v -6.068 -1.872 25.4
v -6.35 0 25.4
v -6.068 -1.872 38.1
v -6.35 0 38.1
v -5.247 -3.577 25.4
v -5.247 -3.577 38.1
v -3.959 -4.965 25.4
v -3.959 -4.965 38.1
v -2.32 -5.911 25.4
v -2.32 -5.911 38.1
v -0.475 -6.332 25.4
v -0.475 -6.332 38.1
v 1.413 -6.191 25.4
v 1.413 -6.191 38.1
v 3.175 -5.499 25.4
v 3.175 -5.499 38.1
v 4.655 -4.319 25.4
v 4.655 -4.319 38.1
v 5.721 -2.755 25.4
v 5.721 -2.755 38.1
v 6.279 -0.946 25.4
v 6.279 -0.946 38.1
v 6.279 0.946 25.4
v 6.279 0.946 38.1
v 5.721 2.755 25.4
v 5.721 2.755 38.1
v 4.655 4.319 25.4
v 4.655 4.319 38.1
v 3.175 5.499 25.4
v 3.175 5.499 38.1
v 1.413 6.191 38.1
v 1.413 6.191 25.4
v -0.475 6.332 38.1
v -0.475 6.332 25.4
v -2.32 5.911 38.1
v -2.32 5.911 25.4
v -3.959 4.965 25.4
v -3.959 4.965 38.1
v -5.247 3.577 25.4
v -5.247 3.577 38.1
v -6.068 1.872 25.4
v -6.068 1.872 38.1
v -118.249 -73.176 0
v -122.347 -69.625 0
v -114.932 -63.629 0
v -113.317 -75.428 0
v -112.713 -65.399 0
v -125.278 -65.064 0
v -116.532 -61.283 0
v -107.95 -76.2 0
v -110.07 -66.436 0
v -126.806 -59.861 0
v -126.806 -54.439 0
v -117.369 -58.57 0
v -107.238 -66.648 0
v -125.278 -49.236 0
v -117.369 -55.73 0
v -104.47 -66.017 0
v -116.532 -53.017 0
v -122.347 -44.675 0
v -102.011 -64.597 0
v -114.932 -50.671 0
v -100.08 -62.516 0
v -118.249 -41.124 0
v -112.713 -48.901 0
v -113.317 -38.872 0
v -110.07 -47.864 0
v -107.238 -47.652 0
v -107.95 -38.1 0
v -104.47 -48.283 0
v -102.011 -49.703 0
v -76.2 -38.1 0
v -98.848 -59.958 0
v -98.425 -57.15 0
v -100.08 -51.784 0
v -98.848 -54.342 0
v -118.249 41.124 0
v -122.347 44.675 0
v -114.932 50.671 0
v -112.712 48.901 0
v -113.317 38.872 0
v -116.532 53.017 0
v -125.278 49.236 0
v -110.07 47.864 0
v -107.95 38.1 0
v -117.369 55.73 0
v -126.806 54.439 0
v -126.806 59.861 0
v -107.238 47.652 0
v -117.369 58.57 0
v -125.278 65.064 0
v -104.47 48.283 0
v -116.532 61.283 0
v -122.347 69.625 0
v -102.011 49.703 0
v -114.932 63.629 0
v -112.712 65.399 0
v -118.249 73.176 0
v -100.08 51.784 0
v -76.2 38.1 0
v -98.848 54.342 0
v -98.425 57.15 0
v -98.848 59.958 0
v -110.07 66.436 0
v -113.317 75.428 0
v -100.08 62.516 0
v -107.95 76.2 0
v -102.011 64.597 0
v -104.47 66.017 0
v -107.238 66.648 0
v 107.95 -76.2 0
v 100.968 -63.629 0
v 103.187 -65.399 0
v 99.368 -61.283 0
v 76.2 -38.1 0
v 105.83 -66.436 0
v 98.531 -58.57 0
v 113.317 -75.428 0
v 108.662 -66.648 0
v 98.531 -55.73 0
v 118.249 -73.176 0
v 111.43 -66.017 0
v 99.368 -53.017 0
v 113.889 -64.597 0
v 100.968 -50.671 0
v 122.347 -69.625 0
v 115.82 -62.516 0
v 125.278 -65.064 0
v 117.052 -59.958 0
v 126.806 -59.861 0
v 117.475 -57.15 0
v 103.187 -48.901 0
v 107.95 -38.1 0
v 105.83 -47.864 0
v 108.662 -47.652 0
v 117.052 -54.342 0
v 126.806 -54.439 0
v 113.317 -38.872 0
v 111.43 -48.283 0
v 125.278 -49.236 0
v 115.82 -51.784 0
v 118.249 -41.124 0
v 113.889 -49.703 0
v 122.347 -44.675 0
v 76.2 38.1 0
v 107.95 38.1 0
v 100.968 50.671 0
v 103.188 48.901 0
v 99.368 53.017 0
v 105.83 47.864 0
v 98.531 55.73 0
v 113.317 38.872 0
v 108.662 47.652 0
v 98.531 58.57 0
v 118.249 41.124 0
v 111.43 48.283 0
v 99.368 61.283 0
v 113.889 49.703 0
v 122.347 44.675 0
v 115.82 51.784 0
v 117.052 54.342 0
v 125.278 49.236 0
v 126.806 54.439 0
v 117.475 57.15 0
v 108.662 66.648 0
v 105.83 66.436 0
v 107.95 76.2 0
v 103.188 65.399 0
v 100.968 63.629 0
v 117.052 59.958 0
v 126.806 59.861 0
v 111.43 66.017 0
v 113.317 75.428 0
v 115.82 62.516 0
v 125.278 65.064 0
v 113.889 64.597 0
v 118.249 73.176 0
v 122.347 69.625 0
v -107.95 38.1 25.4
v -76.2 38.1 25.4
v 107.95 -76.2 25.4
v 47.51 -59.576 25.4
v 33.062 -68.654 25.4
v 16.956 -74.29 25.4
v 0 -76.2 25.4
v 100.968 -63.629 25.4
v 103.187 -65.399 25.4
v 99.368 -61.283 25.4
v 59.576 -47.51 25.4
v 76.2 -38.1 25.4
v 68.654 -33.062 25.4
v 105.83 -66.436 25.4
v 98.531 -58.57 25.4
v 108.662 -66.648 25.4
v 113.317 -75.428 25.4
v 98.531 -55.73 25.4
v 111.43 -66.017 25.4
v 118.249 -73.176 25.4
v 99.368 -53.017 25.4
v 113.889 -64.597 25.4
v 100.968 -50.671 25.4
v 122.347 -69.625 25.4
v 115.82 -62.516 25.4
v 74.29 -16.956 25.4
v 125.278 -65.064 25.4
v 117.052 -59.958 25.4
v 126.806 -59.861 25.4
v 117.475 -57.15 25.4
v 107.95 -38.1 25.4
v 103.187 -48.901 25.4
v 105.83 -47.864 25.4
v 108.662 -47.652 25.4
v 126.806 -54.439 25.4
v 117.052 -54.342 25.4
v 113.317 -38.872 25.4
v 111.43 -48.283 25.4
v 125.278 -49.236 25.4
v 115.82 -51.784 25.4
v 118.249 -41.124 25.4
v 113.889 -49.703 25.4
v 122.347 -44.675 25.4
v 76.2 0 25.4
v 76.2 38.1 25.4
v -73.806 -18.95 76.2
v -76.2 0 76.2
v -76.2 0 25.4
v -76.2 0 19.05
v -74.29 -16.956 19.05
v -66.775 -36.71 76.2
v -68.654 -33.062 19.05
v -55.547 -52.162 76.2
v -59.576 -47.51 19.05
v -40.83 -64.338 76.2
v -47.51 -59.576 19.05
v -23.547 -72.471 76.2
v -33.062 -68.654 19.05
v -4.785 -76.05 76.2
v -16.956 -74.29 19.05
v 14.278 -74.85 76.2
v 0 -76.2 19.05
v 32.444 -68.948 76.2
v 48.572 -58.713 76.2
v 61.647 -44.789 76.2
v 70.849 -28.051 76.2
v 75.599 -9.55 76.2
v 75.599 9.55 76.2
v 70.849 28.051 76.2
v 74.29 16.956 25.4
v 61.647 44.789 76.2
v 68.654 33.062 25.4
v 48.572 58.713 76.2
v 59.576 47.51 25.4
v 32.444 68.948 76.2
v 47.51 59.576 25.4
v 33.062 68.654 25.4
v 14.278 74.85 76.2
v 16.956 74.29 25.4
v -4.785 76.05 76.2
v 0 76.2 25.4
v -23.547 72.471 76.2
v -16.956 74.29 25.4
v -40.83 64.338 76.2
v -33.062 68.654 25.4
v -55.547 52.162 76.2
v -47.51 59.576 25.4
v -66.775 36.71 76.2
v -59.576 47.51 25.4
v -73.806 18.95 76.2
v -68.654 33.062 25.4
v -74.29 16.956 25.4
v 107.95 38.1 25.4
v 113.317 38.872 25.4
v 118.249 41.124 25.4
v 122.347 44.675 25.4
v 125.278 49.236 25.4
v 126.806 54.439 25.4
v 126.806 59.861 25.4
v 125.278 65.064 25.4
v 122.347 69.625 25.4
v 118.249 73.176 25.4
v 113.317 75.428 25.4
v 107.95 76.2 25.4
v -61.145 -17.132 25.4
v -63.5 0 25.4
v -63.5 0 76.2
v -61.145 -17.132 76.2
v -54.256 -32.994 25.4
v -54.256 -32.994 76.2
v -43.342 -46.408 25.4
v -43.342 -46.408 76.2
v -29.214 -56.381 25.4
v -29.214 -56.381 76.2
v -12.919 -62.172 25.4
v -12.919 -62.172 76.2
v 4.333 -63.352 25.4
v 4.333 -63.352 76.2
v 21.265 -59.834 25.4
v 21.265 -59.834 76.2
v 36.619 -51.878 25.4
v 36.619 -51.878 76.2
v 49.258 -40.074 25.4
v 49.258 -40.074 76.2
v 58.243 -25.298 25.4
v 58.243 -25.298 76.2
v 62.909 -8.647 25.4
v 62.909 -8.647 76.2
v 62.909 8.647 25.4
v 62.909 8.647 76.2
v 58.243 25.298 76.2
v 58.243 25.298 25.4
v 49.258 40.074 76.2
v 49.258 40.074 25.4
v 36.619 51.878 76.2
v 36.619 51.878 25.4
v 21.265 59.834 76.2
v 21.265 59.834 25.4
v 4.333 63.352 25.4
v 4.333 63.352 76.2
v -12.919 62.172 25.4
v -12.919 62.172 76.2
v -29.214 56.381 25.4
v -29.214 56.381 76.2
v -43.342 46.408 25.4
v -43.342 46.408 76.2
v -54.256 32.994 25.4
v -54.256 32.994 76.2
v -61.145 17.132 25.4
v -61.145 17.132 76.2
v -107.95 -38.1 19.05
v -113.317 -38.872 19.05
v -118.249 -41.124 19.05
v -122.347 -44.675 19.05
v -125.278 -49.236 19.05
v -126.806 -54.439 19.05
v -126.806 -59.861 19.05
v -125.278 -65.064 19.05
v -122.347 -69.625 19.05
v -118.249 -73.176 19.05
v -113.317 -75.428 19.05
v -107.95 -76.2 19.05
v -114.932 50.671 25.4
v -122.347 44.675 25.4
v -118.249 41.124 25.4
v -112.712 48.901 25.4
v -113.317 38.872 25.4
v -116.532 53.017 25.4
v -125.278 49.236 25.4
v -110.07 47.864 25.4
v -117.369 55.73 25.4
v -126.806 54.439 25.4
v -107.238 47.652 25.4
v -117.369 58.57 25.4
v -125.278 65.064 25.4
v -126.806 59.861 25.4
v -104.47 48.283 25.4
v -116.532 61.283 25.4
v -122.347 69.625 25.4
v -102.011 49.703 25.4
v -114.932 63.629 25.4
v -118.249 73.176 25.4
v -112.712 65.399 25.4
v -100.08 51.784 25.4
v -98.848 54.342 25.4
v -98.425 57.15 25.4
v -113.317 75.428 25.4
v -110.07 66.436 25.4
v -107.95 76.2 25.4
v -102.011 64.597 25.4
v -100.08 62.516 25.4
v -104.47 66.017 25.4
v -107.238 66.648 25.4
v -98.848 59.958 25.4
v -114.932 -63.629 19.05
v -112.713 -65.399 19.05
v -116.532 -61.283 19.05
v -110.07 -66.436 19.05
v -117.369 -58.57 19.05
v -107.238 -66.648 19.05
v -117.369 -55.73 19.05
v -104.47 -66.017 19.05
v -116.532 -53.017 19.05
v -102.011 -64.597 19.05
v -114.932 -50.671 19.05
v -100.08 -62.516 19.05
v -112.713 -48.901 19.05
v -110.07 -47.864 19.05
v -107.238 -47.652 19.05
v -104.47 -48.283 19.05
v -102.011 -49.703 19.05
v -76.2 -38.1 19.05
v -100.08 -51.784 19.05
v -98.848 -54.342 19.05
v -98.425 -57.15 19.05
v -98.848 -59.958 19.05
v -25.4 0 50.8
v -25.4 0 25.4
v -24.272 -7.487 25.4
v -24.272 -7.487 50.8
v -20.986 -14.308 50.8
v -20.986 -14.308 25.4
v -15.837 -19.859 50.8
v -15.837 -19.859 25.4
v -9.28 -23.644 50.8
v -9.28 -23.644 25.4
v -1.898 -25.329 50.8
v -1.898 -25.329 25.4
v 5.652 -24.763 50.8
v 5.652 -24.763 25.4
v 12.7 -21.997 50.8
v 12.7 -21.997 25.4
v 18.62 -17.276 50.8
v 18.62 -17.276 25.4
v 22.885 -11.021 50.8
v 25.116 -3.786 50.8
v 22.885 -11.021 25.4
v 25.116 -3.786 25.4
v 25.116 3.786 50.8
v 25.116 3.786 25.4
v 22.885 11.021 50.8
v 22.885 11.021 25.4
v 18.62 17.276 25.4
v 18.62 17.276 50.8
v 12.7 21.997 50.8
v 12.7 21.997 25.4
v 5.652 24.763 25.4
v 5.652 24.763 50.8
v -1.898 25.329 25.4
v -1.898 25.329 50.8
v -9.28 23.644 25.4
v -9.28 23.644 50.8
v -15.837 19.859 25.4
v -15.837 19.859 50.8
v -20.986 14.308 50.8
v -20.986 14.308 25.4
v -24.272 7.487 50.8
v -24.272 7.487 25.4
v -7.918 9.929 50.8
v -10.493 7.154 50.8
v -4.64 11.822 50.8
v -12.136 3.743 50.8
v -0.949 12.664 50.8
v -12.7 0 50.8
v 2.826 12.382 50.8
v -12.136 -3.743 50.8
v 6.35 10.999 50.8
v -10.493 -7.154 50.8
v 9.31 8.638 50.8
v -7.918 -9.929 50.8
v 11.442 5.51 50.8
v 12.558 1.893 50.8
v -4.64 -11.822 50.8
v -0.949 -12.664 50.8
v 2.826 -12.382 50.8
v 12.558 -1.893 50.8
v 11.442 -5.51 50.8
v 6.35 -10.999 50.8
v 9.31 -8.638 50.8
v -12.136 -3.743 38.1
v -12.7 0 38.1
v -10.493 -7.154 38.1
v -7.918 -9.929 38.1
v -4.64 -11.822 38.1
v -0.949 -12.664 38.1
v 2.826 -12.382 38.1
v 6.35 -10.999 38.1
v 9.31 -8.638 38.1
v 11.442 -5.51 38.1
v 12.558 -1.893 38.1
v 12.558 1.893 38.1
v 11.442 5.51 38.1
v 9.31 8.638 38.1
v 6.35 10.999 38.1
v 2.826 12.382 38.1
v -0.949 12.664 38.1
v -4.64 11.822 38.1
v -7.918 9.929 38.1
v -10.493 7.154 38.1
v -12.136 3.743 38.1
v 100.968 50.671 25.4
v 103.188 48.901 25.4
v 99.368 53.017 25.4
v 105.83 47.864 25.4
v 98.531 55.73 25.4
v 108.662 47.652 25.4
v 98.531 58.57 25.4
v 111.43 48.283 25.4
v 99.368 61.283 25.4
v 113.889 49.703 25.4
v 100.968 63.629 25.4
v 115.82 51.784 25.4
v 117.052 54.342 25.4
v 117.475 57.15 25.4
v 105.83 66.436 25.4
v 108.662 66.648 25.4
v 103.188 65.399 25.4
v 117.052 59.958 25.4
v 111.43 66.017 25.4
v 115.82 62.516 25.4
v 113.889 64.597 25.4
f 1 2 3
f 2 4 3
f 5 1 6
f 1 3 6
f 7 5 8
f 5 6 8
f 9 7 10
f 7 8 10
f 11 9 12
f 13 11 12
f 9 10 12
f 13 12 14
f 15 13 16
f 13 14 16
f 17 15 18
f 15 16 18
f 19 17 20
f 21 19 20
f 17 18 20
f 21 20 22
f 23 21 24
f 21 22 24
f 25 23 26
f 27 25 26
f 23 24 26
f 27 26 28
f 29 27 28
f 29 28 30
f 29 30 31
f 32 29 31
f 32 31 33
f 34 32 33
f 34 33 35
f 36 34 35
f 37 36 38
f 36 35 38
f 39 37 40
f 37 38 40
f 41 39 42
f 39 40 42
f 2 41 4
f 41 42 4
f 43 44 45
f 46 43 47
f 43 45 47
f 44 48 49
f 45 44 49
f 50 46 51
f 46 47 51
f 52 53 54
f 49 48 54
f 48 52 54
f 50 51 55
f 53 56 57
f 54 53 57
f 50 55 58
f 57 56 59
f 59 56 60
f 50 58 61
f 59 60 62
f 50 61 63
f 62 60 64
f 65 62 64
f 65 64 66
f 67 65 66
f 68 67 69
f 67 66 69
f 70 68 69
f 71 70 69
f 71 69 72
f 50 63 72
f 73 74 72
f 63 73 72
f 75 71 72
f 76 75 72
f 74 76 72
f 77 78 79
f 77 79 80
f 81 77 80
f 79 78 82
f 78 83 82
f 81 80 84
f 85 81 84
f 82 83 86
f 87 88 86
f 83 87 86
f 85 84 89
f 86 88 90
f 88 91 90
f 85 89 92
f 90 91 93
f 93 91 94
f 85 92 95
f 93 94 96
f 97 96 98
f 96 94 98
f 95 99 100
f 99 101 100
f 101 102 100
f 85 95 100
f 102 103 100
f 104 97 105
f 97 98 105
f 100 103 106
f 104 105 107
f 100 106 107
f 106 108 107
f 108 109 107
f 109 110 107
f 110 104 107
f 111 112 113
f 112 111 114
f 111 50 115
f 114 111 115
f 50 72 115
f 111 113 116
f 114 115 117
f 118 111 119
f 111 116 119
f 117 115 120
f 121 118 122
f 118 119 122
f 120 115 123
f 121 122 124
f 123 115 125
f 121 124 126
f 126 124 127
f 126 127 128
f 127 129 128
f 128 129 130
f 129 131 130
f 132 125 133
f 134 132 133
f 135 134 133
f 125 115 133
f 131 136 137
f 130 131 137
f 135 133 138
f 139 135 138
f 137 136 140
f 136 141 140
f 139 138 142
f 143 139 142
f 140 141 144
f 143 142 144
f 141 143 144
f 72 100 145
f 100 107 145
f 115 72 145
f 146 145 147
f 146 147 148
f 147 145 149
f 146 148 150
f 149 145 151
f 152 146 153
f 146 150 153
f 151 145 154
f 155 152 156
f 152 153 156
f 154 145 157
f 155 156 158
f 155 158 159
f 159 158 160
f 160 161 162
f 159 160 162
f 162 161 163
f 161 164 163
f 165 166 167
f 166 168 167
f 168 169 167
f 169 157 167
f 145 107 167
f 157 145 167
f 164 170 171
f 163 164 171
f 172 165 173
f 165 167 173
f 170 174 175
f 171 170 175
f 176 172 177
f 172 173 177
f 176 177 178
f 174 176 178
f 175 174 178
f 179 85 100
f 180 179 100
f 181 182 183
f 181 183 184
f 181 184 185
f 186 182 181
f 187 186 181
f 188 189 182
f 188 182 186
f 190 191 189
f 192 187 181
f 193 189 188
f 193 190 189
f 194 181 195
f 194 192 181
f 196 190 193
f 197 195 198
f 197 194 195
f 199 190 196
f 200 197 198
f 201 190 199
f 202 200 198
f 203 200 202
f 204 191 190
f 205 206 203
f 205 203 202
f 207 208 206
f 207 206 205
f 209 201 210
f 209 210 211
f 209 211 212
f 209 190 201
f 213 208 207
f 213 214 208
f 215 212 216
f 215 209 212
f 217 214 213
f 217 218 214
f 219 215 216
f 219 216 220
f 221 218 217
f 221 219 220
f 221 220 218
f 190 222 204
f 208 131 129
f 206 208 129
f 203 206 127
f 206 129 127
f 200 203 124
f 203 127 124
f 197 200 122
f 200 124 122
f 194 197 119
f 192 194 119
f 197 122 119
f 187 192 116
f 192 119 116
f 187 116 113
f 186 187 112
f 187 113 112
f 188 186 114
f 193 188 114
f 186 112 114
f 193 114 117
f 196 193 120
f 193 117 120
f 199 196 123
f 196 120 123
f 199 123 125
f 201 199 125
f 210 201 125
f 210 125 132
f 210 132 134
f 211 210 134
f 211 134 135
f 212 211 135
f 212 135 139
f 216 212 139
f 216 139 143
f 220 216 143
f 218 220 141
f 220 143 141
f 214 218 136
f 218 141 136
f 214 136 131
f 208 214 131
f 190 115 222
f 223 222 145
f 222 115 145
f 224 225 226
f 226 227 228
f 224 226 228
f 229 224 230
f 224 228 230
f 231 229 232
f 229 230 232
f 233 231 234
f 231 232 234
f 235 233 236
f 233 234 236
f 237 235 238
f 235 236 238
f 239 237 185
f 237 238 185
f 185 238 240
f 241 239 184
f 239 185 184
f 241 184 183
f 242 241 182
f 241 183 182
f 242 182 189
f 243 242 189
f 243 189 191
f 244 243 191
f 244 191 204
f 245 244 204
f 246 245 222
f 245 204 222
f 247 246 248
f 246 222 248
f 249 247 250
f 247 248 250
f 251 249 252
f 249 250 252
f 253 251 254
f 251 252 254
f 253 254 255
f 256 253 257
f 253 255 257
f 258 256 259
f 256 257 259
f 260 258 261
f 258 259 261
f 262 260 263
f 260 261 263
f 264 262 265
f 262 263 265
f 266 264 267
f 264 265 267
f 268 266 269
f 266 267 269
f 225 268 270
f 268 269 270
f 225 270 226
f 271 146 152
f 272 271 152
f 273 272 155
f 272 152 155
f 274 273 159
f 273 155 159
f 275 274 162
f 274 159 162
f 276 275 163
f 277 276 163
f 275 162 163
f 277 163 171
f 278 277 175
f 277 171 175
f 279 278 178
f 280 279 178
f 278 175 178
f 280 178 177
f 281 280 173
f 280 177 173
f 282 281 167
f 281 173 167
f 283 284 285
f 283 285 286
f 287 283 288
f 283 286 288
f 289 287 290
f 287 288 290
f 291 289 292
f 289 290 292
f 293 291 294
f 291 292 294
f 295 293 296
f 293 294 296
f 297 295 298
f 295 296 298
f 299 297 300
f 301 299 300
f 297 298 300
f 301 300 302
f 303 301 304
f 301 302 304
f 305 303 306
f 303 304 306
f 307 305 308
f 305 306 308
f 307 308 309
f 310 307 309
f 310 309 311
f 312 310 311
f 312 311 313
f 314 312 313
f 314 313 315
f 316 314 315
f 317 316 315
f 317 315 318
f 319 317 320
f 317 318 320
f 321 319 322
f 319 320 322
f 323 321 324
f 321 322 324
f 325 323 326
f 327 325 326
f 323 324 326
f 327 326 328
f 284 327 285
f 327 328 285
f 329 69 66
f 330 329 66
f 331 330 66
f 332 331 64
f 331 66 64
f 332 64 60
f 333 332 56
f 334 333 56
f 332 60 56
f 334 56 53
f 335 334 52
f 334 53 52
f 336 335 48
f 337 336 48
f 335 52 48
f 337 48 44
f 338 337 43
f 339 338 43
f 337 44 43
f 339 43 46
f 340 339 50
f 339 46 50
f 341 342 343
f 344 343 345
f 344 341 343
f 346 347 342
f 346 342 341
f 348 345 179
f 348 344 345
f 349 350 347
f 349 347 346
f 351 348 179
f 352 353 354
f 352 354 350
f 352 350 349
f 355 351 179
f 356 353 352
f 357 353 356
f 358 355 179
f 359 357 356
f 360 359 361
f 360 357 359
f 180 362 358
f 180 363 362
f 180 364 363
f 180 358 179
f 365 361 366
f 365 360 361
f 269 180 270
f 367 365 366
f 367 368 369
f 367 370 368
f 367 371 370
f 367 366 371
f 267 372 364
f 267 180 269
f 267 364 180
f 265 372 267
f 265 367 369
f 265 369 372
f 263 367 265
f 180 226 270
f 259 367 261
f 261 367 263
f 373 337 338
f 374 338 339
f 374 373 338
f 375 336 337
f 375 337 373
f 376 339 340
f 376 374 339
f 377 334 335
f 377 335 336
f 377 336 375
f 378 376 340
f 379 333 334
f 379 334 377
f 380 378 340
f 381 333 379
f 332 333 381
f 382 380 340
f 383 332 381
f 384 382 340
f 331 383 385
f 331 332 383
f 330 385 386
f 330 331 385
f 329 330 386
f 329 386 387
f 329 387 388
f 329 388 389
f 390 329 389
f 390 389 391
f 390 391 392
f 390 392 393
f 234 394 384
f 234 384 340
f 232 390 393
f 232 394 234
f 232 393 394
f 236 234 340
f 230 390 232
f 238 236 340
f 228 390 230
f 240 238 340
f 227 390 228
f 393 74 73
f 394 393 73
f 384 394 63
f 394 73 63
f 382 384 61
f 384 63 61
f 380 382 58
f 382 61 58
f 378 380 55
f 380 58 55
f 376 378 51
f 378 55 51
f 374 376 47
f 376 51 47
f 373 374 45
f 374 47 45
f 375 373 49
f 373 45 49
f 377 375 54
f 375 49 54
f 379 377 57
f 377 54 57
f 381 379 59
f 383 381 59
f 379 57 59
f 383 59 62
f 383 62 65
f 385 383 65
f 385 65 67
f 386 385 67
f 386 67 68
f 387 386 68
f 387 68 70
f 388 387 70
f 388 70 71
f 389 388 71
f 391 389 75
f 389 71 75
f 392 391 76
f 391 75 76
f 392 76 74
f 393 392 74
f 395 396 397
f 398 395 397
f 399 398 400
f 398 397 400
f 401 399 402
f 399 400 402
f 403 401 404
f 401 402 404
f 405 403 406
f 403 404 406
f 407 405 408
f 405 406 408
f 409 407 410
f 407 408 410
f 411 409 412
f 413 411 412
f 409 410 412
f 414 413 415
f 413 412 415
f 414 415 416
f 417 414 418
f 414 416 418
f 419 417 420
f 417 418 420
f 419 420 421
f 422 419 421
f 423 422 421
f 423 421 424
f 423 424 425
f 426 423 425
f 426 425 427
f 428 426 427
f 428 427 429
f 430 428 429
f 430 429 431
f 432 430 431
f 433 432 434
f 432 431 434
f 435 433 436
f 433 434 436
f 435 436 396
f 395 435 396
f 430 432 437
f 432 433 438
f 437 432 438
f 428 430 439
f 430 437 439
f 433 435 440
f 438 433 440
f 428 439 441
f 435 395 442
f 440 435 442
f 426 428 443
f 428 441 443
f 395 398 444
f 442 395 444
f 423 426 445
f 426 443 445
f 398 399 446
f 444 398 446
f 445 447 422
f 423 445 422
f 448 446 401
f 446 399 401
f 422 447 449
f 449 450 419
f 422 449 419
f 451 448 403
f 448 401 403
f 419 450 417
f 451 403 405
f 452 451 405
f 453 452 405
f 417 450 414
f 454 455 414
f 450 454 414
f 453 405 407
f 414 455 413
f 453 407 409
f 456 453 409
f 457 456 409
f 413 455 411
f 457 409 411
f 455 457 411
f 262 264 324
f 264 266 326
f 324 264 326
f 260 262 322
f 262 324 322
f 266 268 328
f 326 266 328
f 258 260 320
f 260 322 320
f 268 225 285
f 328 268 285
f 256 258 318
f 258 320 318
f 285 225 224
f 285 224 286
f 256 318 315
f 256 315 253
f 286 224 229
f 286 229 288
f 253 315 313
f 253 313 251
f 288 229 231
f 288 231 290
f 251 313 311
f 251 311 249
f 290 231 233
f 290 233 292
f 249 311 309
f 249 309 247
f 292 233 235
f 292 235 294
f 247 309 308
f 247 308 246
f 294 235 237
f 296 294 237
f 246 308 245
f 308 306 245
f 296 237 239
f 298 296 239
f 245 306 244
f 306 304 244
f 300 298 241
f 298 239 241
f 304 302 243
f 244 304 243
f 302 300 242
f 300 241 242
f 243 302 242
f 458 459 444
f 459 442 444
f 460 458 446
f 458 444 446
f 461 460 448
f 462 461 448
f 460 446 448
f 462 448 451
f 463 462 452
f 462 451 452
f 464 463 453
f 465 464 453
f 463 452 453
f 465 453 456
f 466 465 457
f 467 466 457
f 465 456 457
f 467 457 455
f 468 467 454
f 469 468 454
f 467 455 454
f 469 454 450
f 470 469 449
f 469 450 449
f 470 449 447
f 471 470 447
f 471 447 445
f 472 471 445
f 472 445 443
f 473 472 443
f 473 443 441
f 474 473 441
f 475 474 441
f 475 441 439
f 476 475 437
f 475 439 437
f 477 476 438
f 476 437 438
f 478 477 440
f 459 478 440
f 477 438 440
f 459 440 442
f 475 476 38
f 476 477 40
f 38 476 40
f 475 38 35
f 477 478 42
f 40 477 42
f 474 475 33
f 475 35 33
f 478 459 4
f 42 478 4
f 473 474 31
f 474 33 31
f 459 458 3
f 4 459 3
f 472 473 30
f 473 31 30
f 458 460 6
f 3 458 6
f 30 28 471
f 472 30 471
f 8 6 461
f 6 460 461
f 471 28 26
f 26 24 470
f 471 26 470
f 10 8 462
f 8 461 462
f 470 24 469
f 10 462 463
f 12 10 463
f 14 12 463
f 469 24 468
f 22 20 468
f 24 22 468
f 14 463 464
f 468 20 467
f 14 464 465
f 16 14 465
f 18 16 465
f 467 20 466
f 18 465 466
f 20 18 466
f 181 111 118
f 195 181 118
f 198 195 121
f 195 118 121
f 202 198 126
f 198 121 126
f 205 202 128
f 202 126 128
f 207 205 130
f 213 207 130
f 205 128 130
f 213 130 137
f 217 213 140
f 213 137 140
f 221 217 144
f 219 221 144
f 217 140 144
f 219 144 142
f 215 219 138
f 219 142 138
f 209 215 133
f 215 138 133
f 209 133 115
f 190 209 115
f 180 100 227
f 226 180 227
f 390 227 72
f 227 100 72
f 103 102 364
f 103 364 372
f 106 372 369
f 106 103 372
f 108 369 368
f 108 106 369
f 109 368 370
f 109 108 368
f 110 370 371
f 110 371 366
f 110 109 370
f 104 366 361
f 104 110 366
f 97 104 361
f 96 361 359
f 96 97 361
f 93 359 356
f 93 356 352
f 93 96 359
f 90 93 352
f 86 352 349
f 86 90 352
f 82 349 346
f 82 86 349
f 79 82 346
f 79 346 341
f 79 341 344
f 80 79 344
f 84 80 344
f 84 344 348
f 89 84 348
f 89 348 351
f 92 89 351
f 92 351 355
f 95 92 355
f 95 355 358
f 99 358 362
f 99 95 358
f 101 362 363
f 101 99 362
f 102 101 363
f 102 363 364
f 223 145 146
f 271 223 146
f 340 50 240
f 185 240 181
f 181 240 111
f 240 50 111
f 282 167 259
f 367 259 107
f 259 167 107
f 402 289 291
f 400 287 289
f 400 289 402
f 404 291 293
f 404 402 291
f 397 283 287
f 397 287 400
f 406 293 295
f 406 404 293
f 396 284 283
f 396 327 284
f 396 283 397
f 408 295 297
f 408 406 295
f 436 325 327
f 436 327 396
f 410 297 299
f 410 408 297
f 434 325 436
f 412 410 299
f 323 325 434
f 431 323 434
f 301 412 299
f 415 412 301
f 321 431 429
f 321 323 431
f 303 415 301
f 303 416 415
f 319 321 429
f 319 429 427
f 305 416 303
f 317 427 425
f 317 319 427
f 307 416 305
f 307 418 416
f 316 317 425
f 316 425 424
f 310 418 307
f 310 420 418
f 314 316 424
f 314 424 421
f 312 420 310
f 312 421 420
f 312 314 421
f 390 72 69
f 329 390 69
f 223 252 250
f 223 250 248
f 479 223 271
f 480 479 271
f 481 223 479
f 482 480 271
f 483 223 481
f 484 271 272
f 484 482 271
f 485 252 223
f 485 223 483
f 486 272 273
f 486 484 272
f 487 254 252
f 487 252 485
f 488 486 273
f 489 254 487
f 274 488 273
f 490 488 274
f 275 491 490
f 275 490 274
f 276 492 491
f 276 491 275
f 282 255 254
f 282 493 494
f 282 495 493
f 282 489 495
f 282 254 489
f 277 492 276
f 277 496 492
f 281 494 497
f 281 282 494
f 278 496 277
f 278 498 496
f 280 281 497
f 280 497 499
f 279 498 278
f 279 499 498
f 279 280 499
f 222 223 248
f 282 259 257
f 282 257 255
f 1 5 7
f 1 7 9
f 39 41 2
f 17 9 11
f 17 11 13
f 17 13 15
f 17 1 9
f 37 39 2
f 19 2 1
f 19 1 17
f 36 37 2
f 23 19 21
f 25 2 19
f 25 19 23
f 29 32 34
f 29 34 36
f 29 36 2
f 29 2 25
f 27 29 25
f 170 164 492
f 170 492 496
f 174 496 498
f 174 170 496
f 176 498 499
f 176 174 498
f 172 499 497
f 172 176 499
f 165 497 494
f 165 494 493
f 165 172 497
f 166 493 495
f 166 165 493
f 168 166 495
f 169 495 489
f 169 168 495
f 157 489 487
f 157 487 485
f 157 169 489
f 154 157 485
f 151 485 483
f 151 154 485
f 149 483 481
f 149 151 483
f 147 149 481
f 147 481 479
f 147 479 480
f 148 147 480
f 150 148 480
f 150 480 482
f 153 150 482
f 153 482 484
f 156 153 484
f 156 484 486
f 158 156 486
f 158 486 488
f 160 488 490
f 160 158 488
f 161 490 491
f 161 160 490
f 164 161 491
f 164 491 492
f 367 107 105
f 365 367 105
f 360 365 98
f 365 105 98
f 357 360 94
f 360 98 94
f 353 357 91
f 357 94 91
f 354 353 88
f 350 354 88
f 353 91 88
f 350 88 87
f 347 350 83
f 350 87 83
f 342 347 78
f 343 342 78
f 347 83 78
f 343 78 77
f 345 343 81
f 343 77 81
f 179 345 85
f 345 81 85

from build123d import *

# Parameters (mm, degrees)
F3_DEPTH = 19.05
F2_R     = 9.525
F4_DEPTH = 25.4


with BuildPart() as f1:
    # F0 (on Front) → F1 (revolve)
    with BuildSketch(Plane.XZ):
        Polygon((-76.2, 0), (-6.35, 0), (-6.35, 38.1), (-12.7, 38.1), (-12.7, 50.8), (-25.4, 50.8), (-25.4, 19.05), (-63.5, 19.05), (-63.5, 76.2), (-76.2, 76.2), align=None)
    revolve(axis=Axis((0, 0, 38.1), (0, 0, 1)))

    # F2 (on Top) → F3 (join)
    with BuildSketch(Plane.XY):
        with BuildLine():
            Line((-107.95, -76.2), (0, -76.2))
            ThreePointArc((0, -76.2), (-53.8815367264, -53.8815367264), (-76.2, 0))
            Line((-76.2, 0), (-76.2, -38.1))
            Line((-76.2, -38.1), (-107.95, -38.1))
            Line((-107.95, -38.1), (-107.95, -47.625))
            ThreePointArc((-107.95, -47.625), (-101.2148079092, -50.4148079092), (-98.425, -57.15))
            ThreePointArc((-98.425, -57.15), (-101.2148079092, -63.8851920908), (-107.95, -66.675))
            Line((-107.95, -66.675), (-107.95, -76.2))
        make_face()
        with BuildLine():
            ThreePointArc((-107.95, -38.1), (-127, -57.15), (-107.95, -76.2))
            Line((-107.95, -76.2), (-107.95, -66.675))
            ThreePointArc((-107.95, -66.675), (-117.475, -57.15), (-107.95, -47.625))
            Line((-107.95, -47.625), (-107.95, -38.1))
        make_face()
    extrude(amount=F3_DEPTH)

    # F2 (on Top) → F4 (join)
    with BuildSketch(Plane.XY):
        with BuildLine():
            Line((107.95, -66.675), (107.95, -76.2))
            ThreePointArc((107.95, -76.2), (127, -57.15), (107.95, -38.1))
            Line((107.95, -38.1), (107.95, -47.625))
            ThreePointArc((107.95, -47.625), (114.6851920908, -50.4148079092), (117.475, -57.15))
            ThreePointArc((117.475, -57.15), (114.6851920908, -63.8851920908), (107.95, -66.675))
        make_face()
        with BuildLine():
            ThreePointArc((-76.2, 0), (-53.8815367264, -53.8815367264), (0, -76.2))
            Line((0, -76.2), (107.95, -76.2))
            Line((107.95, -76.2), (107.95, -66.675))
            ThreePointArc((107.95, -66.675), (98.425, -57.15), (107.95, -47.625))
            Line((107.95, -47.625), (107.95, -38.1))
            Line((107.95, -38.1), (76.2, -38.1))
            Line((76.2, -38.1), (76.2, 0))
            Line((76.2, 0), (76.2, 38.1))
            Line((76.2, 38.1), (107.95, 38.1))
            ThreePointArc((107.95, 38.1), (127, 57.15), (107.95, 76.2))
            Line((107.95, 76.2), (0, 76.2))
            Line((0, 76.2), (-107.95, 76.2))
            ThreePointArc((-107.95, 76.2), (-127, 57.15), (-107.95, 38.1))
            Line((-107.95, 38.1), (-76.2, 38.1))
            Line((-76.2, 38.1), (-76.2, 0))
        make_face()
        with Locations((-107.95, 57.15)):
            Circle(F2_R, mode=Mode.SUBTRACT)
        with Locations((107.95, 57.15)):
            Circle(F2_R, mode=Mode.SUBTRACT)
    extrude(amount=F4_DEPTH)


solid = f1.part
